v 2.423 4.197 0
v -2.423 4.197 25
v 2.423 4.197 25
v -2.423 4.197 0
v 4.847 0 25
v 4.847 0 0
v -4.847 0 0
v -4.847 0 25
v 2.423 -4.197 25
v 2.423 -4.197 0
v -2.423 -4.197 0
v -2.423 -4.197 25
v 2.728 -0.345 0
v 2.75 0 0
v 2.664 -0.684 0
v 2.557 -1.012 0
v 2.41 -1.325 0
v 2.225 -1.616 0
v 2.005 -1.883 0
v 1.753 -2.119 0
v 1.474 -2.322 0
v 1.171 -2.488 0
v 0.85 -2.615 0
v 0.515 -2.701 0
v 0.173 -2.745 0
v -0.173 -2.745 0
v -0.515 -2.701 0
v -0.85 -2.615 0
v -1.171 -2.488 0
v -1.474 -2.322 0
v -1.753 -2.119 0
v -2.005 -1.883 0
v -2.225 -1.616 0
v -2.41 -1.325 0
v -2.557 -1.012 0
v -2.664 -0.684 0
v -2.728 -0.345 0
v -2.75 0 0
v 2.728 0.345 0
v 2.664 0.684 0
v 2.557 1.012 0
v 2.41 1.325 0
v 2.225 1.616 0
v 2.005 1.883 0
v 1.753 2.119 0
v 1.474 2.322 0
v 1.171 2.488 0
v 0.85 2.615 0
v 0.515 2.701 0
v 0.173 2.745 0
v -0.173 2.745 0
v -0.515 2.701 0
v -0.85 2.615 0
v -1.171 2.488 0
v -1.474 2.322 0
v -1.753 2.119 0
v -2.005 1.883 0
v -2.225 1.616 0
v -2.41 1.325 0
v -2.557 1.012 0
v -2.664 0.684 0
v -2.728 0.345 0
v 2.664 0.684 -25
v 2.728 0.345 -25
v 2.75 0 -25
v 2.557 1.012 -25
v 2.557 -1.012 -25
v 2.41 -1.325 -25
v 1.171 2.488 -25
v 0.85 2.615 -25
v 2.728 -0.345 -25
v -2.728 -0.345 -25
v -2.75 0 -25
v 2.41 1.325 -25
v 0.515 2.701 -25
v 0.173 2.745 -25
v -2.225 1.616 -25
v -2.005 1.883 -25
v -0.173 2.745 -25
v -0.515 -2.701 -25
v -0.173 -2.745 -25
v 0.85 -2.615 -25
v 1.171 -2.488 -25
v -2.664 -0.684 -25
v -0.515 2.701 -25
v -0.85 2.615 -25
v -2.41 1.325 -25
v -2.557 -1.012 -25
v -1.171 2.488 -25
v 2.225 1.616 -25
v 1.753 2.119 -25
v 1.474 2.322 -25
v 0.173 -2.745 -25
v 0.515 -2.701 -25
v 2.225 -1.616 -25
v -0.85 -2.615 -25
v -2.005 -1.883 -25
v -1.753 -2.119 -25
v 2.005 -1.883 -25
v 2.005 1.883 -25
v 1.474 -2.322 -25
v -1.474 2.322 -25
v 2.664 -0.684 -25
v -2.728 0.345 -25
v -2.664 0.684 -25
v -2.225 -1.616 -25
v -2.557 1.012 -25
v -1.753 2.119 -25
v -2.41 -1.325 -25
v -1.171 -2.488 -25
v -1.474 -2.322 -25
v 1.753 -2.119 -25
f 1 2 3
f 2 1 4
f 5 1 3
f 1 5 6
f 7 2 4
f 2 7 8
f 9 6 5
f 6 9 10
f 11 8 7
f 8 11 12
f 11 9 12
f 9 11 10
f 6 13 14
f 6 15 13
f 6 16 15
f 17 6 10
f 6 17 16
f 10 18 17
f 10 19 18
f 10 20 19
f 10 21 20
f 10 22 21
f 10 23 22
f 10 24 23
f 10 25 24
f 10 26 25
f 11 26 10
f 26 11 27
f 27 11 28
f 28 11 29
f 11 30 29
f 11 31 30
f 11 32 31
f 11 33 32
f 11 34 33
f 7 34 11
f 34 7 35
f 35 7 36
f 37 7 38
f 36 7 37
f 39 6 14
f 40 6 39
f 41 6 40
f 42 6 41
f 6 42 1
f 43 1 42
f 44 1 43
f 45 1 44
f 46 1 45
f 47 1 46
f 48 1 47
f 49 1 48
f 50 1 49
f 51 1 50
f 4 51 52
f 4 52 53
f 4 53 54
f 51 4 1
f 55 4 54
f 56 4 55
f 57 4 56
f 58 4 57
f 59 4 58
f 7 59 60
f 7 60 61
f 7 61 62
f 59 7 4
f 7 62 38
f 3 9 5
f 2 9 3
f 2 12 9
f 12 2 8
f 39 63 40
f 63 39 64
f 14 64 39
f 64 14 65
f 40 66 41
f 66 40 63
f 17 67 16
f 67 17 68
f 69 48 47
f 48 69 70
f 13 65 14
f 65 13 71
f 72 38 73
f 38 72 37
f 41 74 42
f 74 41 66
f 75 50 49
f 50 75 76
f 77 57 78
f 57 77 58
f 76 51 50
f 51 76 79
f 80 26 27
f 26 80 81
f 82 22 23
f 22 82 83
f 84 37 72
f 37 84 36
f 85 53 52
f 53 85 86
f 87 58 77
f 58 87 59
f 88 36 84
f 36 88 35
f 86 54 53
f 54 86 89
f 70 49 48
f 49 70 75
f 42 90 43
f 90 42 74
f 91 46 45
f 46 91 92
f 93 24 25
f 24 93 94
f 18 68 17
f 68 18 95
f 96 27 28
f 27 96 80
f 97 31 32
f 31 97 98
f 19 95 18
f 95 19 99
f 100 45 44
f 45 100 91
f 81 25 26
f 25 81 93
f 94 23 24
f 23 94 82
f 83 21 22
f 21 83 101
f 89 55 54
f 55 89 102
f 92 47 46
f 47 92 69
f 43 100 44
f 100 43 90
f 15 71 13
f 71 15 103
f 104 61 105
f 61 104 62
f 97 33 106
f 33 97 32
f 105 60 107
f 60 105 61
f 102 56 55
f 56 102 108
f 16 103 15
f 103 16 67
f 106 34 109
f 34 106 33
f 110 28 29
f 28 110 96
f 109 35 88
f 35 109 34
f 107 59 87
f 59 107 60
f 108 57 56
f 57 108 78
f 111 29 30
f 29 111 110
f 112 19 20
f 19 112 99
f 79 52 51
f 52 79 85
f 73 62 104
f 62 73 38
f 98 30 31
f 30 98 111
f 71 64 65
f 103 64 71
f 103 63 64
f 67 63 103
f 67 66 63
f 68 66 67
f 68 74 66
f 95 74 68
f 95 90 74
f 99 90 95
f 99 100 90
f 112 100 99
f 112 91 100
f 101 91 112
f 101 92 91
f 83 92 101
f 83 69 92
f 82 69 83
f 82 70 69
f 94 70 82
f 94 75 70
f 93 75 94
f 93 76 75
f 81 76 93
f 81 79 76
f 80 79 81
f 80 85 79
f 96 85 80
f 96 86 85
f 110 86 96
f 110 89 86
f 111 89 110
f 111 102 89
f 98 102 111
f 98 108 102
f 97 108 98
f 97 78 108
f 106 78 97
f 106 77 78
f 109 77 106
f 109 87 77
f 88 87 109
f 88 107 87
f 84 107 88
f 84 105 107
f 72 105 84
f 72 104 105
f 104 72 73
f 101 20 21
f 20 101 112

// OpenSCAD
$fn = 50;


difference() {
	union() {
		linear_extrude(height = 25) {
			polygon(points = [[4.8468000000, 0.0000000000], [2.4234000000, 4.1974519271], [-2.4234000000, 4.1974519271], [-4.8468000000, 0.0000000000], [-2.4234000000, -4.1974519271], [2.4234000000, -4.1974519271]]);
		}
		translate(v = [0, 0, -25]) {
			cylinder(h = 25, r = 2.7500000000);
		}
	}
	union();
}
